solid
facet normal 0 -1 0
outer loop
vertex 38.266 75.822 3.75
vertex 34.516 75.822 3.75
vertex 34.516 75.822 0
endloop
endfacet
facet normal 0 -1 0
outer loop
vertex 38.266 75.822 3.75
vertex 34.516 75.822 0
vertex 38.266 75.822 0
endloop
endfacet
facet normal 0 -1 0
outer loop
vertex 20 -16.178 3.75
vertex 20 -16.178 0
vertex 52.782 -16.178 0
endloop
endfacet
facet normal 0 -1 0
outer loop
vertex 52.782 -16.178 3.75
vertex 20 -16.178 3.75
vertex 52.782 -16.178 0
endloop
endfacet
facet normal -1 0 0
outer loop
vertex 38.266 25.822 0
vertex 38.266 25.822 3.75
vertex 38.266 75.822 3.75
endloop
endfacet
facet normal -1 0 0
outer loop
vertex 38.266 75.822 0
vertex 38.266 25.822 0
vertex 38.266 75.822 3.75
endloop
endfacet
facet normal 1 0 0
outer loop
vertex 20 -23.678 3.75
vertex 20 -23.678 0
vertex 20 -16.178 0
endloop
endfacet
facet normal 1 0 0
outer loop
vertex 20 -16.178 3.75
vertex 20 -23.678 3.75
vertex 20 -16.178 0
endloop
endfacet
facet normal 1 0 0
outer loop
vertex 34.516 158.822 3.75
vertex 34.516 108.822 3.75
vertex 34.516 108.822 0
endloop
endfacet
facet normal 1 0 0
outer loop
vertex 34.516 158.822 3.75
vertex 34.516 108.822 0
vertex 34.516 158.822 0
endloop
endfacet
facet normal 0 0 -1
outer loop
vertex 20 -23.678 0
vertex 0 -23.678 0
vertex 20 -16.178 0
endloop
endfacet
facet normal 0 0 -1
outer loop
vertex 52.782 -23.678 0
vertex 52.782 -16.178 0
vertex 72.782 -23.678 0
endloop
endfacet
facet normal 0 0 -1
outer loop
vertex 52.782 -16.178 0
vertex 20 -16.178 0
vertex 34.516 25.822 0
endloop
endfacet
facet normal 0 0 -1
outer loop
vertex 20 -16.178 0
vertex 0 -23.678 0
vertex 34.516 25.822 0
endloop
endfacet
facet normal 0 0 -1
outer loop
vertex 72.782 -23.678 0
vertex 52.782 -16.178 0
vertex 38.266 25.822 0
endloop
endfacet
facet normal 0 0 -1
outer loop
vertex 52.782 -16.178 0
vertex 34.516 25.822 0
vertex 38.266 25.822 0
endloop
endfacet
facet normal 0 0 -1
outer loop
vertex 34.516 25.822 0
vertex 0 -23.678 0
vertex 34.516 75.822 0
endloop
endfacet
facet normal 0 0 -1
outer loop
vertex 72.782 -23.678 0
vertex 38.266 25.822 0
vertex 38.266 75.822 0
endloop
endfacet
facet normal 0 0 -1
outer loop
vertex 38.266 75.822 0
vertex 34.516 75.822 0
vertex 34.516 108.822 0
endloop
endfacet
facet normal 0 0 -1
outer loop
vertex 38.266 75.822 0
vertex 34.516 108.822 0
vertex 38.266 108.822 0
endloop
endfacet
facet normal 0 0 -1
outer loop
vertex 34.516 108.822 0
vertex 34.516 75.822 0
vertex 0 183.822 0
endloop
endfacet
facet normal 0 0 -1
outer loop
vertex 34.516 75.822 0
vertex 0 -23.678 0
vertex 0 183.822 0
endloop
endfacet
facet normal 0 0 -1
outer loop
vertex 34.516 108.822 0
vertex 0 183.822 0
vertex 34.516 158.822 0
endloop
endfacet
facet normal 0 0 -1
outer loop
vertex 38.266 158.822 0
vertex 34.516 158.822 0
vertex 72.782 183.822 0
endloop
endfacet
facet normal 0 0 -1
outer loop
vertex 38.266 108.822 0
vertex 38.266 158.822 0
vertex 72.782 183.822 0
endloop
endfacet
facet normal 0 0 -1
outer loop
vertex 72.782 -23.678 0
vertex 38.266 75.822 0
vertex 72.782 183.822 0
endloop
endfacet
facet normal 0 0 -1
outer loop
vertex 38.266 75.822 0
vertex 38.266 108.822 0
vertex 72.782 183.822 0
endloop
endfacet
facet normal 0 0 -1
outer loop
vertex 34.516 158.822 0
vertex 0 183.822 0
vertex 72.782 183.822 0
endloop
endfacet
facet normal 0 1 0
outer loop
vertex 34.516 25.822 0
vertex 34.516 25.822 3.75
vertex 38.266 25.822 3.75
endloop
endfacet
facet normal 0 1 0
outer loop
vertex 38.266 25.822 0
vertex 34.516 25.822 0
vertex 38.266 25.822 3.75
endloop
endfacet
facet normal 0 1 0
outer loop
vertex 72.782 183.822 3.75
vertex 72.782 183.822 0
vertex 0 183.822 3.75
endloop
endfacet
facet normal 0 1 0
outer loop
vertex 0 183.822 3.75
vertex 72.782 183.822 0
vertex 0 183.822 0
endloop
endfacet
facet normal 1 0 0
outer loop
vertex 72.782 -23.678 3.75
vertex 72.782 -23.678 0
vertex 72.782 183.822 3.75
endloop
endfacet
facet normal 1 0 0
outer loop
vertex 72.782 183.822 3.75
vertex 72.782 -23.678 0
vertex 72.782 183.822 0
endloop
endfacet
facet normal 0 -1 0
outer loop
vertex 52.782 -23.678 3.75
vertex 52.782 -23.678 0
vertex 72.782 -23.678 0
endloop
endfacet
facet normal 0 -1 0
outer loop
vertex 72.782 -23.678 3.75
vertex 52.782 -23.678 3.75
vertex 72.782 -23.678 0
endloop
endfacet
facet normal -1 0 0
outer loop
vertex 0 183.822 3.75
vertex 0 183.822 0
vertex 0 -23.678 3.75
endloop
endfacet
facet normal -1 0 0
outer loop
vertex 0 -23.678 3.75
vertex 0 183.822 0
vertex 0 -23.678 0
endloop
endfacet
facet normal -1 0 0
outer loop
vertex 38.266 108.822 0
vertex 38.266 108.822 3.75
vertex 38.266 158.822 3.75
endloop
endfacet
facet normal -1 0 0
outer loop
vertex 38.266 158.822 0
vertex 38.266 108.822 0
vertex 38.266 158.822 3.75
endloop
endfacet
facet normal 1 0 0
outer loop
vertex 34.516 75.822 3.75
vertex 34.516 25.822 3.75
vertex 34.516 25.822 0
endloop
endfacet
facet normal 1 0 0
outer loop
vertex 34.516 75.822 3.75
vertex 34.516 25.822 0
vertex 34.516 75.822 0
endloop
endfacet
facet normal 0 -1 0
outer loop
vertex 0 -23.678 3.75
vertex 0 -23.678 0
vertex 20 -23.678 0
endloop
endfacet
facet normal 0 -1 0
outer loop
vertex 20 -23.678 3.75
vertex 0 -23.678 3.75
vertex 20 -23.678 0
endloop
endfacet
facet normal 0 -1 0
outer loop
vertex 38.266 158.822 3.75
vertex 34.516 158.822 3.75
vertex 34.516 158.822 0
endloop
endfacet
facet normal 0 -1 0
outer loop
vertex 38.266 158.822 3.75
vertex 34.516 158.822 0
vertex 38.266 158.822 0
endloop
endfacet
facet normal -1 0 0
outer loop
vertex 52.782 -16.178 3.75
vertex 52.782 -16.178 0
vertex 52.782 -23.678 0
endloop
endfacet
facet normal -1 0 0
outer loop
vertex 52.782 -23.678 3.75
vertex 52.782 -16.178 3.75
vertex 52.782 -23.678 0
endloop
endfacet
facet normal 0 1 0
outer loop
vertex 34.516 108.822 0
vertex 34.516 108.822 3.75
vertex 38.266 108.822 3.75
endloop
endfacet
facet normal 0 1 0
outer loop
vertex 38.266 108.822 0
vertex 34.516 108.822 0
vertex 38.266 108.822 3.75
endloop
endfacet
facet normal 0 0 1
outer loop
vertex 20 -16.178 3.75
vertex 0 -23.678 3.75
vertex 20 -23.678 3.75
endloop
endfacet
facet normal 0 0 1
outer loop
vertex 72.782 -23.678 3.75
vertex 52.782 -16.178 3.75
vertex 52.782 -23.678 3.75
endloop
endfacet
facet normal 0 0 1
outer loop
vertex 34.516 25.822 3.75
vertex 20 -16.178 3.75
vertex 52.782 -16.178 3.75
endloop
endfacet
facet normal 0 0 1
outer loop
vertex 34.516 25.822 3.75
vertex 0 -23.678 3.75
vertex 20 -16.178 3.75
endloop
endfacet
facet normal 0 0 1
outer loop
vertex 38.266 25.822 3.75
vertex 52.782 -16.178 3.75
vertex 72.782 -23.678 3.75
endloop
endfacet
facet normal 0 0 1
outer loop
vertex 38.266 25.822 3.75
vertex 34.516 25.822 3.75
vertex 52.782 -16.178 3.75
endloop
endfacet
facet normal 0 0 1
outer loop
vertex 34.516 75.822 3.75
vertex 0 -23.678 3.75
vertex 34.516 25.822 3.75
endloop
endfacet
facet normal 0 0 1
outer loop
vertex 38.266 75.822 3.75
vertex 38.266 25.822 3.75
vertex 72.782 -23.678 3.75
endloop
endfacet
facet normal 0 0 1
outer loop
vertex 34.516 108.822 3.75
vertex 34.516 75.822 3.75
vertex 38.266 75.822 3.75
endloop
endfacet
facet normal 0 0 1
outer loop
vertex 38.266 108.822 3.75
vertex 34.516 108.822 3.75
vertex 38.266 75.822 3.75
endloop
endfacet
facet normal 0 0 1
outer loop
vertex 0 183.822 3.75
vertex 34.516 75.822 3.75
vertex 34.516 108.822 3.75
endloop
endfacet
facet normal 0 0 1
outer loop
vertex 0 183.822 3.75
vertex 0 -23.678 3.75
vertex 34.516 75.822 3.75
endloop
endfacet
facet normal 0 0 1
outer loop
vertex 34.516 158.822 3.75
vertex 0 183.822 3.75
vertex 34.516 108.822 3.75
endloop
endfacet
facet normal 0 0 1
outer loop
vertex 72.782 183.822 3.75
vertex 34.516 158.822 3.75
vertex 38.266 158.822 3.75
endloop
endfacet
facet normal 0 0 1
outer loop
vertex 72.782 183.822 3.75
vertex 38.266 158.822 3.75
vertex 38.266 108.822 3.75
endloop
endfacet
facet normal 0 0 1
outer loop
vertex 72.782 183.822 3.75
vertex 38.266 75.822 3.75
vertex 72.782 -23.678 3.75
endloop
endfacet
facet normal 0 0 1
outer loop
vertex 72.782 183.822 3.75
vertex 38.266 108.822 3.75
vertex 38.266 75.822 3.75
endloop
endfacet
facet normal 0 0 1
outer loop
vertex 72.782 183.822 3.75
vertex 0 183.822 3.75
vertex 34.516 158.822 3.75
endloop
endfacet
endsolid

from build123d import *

# Parameters (mm, degrees)
F1_DEPTH = 3.75
F2_W     = 3.75
F2_H     = 50
F3_DEPTH = 3.75


with BuildPart() as f1:
    # F0 (on Top) → F1 (new body)
    with BuildSketch(Plane.XY):
        Polygon((20, -23.677632), (20, -16.177632), (52.782, -16.177632), (52.782, -23.677632), (72.782, -23.677632), (72.782, -16.177632), (72.782, 183.822368), (0, 183.822368), (0, -16.177632), (0, -23.677632), align=None)
    extrude(amount=F1_DEPTH)

    # F2 (on face) → F3 (cut)
    with BuildSketch(Plane.XY.offset(3.75)):
        with Locations((36.391, 50.822368)):
            Rectangle(F2_W, F2_H)
        with Locations((36.391, 133.822368)):
            Rectangle(F2_W, F2_H)
    extrude(amount=-F3_DEPTH, mode=Mode.SUBTRACT)


solid = f1.part
